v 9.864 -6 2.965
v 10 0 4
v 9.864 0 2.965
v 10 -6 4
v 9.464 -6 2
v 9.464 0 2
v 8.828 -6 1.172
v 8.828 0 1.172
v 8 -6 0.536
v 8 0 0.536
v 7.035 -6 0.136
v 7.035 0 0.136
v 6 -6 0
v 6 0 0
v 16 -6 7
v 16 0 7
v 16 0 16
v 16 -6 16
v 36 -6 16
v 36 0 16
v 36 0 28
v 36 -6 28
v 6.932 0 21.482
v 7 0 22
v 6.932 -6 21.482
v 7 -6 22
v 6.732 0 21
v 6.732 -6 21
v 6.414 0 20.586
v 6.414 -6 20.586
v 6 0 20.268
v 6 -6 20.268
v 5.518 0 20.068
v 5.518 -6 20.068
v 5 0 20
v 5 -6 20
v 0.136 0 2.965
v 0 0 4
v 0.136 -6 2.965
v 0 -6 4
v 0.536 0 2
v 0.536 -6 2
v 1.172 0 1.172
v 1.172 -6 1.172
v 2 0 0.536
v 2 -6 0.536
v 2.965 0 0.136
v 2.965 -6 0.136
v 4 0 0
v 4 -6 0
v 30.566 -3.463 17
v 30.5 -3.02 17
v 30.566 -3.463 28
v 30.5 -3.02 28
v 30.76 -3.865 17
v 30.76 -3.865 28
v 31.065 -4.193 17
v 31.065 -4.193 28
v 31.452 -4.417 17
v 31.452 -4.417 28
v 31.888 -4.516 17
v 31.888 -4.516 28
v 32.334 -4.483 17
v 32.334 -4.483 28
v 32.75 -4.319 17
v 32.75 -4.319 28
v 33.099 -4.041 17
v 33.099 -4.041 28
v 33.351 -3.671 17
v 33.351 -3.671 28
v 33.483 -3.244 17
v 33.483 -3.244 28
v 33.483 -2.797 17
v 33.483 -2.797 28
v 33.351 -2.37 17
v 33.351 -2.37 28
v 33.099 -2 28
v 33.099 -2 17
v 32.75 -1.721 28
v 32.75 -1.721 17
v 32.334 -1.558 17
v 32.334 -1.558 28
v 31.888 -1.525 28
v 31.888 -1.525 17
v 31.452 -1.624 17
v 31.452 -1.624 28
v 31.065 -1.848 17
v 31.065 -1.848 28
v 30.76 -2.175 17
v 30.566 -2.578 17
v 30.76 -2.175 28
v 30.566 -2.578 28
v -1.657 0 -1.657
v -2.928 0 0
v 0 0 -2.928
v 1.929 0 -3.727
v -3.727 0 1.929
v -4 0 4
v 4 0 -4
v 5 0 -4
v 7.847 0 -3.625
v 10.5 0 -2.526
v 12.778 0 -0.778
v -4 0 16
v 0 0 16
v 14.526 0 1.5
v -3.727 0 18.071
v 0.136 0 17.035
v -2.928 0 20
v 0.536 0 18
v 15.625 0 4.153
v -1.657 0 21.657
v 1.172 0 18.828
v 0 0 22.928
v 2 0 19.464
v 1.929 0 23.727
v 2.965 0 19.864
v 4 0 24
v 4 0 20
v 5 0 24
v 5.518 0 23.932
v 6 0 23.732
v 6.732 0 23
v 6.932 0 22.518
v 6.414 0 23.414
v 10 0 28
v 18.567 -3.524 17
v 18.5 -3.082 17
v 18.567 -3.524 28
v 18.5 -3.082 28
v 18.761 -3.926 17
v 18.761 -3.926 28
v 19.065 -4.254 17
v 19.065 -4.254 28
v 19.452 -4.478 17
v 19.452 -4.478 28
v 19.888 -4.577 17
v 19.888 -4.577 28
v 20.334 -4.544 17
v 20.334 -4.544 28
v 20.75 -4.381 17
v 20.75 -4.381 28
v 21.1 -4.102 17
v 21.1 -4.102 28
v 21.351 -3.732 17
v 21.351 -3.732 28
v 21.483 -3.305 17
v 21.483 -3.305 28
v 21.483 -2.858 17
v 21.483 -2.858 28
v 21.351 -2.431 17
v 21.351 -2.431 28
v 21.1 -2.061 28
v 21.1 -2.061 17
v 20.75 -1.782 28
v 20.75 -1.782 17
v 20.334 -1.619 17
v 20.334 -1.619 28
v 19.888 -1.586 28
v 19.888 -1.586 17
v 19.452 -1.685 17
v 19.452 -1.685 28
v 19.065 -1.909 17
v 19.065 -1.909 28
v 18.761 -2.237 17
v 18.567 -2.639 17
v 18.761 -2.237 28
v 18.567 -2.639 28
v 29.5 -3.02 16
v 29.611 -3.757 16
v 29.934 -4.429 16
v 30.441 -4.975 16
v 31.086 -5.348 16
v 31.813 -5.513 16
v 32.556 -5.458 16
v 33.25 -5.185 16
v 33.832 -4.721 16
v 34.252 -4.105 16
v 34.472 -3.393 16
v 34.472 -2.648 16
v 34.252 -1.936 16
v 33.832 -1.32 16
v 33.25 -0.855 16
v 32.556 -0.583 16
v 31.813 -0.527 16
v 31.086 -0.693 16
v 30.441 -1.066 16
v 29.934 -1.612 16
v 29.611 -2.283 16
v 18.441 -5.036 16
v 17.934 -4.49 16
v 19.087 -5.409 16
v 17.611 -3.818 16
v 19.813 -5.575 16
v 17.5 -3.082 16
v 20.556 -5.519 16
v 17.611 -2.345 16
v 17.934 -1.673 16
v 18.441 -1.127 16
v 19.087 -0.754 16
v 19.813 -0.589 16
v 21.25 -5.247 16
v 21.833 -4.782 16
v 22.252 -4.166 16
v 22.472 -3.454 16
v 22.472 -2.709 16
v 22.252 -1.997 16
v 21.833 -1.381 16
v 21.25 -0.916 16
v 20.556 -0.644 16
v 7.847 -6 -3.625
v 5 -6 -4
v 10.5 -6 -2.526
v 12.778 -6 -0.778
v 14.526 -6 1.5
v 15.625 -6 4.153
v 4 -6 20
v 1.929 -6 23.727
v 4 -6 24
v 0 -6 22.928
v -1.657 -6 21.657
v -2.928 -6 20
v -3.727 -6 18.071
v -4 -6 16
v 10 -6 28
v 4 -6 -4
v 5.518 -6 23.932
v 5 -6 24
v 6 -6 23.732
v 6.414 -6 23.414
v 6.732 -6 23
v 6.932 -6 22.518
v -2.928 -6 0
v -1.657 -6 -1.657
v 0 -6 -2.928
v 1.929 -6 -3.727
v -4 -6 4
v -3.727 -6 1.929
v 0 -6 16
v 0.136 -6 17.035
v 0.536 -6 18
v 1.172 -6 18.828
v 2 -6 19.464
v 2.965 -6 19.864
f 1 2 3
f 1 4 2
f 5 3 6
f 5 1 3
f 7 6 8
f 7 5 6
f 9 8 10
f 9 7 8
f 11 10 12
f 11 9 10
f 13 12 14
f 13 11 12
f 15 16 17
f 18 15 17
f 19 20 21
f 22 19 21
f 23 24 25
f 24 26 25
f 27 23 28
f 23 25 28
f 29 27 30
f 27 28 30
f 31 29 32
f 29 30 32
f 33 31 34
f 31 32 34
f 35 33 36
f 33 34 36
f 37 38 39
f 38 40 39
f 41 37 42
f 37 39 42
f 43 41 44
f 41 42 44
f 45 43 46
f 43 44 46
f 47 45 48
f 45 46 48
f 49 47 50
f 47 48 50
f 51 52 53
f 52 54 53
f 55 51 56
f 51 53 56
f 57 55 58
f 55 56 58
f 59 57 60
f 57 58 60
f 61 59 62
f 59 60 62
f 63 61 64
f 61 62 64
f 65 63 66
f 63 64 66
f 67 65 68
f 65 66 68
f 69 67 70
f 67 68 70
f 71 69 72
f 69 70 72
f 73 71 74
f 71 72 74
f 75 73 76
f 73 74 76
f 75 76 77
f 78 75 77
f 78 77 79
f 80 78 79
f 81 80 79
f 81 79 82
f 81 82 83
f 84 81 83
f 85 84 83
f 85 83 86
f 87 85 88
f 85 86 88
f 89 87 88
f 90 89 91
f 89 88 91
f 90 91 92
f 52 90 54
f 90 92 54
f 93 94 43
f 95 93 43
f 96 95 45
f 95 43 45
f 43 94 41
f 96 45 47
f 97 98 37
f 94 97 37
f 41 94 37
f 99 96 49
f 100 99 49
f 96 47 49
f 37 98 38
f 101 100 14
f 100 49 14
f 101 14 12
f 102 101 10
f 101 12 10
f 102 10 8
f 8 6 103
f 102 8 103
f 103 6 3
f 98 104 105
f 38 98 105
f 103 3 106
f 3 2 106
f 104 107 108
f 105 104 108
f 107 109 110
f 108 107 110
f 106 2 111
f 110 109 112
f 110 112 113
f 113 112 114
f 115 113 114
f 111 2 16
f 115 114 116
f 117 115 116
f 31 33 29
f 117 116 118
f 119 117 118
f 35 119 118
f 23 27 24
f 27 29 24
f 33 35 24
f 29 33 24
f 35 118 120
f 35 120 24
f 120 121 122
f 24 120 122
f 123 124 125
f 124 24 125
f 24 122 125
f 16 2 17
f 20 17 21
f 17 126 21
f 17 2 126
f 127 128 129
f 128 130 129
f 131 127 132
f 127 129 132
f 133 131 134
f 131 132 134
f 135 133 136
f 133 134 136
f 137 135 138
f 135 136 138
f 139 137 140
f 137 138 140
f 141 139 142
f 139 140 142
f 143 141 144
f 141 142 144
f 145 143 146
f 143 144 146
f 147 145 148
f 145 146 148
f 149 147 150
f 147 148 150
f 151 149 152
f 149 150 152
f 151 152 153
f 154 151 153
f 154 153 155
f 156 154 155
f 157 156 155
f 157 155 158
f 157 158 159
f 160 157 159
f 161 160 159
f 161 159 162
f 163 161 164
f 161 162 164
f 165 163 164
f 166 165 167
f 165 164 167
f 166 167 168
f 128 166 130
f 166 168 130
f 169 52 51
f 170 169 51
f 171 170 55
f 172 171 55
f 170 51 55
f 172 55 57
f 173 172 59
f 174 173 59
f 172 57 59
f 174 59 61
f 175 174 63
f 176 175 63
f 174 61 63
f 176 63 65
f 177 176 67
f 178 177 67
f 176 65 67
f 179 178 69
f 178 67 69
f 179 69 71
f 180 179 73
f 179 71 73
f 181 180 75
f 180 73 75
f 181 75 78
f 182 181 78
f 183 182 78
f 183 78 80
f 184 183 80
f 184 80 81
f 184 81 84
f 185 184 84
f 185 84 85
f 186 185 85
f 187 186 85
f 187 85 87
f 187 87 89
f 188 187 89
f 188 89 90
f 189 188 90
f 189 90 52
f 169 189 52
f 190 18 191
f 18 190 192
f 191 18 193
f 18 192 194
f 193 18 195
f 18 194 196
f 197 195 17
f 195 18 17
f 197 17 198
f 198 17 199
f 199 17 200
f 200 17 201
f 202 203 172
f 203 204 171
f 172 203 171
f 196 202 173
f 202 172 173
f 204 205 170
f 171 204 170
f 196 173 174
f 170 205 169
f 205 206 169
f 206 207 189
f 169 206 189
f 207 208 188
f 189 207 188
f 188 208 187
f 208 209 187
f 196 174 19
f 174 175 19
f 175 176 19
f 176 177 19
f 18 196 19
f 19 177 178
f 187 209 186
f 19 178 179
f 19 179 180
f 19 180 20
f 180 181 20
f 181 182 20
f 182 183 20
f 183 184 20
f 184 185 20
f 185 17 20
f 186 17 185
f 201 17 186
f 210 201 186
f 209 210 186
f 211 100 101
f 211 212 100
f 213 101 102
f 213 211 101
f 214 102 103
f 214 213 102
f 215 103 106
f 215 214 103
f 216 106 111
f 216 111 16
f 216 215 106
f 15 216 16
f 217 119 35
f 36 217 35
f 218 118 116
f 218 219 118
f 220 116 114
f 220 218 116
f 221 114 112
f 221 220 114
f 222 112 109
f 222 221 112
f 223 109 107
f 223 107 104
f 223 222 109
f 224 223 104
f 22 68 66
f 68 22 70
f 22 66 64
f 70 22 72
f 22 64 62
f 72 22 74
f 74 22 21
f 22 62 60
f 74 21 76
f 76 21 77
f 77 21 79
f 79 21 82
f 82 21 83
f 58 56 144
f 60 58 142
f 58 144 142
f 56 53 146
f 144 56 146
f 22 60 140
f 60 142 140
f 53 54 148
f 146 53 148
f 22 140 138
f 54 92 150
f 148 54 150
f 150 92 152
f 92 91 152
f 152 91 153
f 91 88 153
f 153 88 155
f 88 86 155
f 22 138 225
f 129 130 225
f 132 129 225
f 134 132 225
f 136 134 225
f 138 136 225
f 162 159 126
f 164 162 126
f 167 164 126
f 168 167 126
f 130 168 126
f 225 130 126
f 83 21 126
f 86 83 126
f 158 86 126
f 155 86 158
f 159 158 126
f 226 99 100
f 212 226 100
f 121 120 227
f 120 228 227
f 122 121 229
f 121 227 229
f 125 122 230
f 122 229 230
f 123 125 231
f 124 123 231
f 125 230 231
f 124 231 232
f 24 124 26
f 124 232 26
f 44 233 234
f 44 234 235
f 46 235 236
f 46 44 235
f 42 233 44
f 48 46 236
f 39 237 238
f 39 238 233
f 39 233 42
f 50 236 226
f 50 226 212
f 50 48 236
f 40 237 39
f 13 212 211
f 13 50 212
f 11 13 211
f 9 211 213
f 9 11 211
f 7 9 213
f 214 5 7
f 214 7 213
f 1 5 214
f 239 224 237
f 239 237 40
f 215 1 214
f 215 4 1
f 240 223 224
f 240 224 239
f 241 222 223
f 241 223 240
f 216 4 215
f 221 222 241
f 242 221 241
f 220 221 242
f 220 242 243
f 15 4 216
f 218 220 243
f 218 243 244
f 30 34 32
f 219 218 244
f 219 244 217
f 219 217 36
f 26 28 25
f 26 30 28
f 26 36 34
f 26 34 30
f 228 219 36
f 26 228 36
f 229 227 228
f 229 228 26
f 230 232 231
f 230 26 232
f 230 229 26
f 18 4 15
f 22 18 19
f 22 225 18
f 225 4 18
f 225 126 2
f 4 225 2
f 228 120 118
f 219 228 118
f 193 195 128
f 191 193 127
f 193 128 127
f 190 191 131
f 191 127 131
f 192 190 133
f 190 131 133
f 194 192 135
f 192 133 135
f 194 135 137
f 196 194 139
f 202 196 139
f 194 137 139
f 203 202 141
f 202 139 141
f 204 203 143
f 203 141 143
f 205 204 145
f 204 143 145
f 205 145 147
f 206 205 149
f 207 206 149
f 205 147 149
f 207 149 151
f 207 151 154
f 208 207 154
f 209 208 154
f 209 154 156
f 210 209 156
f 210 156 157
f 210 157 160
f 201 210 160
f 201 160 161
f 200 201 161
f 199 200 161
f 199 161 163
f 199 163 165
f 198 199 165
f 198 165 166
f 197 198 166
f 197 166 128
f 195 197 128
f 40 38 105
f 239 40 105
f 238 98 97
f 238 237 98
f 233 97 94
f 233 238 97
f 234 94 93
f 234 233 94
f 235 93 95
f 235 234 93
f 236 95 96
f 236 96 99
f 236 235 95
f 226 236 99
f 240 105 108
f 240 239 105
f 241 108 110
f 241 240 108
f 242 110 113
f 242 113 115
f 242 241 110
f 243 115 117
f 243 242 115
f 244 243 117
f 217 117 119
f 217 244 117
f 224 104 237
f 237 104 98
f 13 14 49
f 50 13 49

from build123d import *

# Parameters (mm, degrees)
F1_DEPTH       = 6
F2_R           = 4
F3_R           = 8
F4_R           = 11
F5_R           = 1.99999
F7_D           = 3
F7_CSINK_D     = 5
F7_CSINK_ANGLE = 90


# Not quite as in the source:
# - a fillet or chamfer is up to 0.001 mm smaller than in the source, because OpenCascade refuses the exact size


with BuildPart() as f1:
    # F0 (on Front) → F1 (new body)
    with BuildSketch(Plane.XZ):
        Polygon((0, 0), (0, 20), (7, 20), (7, 24), (-4, 24), (-4, -4), (16, -4), (16, 16), (36, 16), (36, 28), (10, 28), (10, 0), align=None)
    extrude(amount=F1_DEPTH)

    # F2
    f2_edges = [f1.edges().sort_by_distance(p)[0] for p in [
        (10, -3, 0),
        (0, -3, 0),
        (0, -3, 20),
    ]]
    fillet(f2_edges, radius=F2_R)

    # F3
    f3_edges = [f1.edges().sort_by_distance(p)[0] for p in [
        (-4, -3, 24),
        (-4, -3, -4),
    ]]
    fillet(f3_edges, radius=F3_R)

    # F4
    f4_edges = [f1.edges().sort_by_distance(p)[0] for p in [
        (16, -3, -4),
    ]]
    fillet(f4_edges, radius=F4_R)

    # F5 (radius 2 in the source; OpenCascade refuses exactly that, so slightly less here)
    f5_edges = [f1.edges().sort_by_distance(p)[0] for p in [
        (7, -3, 24),
        (7, -3, 20),
    ]]
    fillet(f5_edges, radius=F5_R)

    # F7 (through all)
    with Locations(Plane(origin=(0, 0, 16), x_dir=(1, 0, 0), z_dir=(0, 0, -1))):
        with Locations((20, 3.0815127769), (31.9998442765, 3.0203789876)):
            CounterSinkHole(F7_D / 2, F7_CSINK_D / 2, counter_sink_angle=F7_CSINK_ANGLE)


solid = f1.part
